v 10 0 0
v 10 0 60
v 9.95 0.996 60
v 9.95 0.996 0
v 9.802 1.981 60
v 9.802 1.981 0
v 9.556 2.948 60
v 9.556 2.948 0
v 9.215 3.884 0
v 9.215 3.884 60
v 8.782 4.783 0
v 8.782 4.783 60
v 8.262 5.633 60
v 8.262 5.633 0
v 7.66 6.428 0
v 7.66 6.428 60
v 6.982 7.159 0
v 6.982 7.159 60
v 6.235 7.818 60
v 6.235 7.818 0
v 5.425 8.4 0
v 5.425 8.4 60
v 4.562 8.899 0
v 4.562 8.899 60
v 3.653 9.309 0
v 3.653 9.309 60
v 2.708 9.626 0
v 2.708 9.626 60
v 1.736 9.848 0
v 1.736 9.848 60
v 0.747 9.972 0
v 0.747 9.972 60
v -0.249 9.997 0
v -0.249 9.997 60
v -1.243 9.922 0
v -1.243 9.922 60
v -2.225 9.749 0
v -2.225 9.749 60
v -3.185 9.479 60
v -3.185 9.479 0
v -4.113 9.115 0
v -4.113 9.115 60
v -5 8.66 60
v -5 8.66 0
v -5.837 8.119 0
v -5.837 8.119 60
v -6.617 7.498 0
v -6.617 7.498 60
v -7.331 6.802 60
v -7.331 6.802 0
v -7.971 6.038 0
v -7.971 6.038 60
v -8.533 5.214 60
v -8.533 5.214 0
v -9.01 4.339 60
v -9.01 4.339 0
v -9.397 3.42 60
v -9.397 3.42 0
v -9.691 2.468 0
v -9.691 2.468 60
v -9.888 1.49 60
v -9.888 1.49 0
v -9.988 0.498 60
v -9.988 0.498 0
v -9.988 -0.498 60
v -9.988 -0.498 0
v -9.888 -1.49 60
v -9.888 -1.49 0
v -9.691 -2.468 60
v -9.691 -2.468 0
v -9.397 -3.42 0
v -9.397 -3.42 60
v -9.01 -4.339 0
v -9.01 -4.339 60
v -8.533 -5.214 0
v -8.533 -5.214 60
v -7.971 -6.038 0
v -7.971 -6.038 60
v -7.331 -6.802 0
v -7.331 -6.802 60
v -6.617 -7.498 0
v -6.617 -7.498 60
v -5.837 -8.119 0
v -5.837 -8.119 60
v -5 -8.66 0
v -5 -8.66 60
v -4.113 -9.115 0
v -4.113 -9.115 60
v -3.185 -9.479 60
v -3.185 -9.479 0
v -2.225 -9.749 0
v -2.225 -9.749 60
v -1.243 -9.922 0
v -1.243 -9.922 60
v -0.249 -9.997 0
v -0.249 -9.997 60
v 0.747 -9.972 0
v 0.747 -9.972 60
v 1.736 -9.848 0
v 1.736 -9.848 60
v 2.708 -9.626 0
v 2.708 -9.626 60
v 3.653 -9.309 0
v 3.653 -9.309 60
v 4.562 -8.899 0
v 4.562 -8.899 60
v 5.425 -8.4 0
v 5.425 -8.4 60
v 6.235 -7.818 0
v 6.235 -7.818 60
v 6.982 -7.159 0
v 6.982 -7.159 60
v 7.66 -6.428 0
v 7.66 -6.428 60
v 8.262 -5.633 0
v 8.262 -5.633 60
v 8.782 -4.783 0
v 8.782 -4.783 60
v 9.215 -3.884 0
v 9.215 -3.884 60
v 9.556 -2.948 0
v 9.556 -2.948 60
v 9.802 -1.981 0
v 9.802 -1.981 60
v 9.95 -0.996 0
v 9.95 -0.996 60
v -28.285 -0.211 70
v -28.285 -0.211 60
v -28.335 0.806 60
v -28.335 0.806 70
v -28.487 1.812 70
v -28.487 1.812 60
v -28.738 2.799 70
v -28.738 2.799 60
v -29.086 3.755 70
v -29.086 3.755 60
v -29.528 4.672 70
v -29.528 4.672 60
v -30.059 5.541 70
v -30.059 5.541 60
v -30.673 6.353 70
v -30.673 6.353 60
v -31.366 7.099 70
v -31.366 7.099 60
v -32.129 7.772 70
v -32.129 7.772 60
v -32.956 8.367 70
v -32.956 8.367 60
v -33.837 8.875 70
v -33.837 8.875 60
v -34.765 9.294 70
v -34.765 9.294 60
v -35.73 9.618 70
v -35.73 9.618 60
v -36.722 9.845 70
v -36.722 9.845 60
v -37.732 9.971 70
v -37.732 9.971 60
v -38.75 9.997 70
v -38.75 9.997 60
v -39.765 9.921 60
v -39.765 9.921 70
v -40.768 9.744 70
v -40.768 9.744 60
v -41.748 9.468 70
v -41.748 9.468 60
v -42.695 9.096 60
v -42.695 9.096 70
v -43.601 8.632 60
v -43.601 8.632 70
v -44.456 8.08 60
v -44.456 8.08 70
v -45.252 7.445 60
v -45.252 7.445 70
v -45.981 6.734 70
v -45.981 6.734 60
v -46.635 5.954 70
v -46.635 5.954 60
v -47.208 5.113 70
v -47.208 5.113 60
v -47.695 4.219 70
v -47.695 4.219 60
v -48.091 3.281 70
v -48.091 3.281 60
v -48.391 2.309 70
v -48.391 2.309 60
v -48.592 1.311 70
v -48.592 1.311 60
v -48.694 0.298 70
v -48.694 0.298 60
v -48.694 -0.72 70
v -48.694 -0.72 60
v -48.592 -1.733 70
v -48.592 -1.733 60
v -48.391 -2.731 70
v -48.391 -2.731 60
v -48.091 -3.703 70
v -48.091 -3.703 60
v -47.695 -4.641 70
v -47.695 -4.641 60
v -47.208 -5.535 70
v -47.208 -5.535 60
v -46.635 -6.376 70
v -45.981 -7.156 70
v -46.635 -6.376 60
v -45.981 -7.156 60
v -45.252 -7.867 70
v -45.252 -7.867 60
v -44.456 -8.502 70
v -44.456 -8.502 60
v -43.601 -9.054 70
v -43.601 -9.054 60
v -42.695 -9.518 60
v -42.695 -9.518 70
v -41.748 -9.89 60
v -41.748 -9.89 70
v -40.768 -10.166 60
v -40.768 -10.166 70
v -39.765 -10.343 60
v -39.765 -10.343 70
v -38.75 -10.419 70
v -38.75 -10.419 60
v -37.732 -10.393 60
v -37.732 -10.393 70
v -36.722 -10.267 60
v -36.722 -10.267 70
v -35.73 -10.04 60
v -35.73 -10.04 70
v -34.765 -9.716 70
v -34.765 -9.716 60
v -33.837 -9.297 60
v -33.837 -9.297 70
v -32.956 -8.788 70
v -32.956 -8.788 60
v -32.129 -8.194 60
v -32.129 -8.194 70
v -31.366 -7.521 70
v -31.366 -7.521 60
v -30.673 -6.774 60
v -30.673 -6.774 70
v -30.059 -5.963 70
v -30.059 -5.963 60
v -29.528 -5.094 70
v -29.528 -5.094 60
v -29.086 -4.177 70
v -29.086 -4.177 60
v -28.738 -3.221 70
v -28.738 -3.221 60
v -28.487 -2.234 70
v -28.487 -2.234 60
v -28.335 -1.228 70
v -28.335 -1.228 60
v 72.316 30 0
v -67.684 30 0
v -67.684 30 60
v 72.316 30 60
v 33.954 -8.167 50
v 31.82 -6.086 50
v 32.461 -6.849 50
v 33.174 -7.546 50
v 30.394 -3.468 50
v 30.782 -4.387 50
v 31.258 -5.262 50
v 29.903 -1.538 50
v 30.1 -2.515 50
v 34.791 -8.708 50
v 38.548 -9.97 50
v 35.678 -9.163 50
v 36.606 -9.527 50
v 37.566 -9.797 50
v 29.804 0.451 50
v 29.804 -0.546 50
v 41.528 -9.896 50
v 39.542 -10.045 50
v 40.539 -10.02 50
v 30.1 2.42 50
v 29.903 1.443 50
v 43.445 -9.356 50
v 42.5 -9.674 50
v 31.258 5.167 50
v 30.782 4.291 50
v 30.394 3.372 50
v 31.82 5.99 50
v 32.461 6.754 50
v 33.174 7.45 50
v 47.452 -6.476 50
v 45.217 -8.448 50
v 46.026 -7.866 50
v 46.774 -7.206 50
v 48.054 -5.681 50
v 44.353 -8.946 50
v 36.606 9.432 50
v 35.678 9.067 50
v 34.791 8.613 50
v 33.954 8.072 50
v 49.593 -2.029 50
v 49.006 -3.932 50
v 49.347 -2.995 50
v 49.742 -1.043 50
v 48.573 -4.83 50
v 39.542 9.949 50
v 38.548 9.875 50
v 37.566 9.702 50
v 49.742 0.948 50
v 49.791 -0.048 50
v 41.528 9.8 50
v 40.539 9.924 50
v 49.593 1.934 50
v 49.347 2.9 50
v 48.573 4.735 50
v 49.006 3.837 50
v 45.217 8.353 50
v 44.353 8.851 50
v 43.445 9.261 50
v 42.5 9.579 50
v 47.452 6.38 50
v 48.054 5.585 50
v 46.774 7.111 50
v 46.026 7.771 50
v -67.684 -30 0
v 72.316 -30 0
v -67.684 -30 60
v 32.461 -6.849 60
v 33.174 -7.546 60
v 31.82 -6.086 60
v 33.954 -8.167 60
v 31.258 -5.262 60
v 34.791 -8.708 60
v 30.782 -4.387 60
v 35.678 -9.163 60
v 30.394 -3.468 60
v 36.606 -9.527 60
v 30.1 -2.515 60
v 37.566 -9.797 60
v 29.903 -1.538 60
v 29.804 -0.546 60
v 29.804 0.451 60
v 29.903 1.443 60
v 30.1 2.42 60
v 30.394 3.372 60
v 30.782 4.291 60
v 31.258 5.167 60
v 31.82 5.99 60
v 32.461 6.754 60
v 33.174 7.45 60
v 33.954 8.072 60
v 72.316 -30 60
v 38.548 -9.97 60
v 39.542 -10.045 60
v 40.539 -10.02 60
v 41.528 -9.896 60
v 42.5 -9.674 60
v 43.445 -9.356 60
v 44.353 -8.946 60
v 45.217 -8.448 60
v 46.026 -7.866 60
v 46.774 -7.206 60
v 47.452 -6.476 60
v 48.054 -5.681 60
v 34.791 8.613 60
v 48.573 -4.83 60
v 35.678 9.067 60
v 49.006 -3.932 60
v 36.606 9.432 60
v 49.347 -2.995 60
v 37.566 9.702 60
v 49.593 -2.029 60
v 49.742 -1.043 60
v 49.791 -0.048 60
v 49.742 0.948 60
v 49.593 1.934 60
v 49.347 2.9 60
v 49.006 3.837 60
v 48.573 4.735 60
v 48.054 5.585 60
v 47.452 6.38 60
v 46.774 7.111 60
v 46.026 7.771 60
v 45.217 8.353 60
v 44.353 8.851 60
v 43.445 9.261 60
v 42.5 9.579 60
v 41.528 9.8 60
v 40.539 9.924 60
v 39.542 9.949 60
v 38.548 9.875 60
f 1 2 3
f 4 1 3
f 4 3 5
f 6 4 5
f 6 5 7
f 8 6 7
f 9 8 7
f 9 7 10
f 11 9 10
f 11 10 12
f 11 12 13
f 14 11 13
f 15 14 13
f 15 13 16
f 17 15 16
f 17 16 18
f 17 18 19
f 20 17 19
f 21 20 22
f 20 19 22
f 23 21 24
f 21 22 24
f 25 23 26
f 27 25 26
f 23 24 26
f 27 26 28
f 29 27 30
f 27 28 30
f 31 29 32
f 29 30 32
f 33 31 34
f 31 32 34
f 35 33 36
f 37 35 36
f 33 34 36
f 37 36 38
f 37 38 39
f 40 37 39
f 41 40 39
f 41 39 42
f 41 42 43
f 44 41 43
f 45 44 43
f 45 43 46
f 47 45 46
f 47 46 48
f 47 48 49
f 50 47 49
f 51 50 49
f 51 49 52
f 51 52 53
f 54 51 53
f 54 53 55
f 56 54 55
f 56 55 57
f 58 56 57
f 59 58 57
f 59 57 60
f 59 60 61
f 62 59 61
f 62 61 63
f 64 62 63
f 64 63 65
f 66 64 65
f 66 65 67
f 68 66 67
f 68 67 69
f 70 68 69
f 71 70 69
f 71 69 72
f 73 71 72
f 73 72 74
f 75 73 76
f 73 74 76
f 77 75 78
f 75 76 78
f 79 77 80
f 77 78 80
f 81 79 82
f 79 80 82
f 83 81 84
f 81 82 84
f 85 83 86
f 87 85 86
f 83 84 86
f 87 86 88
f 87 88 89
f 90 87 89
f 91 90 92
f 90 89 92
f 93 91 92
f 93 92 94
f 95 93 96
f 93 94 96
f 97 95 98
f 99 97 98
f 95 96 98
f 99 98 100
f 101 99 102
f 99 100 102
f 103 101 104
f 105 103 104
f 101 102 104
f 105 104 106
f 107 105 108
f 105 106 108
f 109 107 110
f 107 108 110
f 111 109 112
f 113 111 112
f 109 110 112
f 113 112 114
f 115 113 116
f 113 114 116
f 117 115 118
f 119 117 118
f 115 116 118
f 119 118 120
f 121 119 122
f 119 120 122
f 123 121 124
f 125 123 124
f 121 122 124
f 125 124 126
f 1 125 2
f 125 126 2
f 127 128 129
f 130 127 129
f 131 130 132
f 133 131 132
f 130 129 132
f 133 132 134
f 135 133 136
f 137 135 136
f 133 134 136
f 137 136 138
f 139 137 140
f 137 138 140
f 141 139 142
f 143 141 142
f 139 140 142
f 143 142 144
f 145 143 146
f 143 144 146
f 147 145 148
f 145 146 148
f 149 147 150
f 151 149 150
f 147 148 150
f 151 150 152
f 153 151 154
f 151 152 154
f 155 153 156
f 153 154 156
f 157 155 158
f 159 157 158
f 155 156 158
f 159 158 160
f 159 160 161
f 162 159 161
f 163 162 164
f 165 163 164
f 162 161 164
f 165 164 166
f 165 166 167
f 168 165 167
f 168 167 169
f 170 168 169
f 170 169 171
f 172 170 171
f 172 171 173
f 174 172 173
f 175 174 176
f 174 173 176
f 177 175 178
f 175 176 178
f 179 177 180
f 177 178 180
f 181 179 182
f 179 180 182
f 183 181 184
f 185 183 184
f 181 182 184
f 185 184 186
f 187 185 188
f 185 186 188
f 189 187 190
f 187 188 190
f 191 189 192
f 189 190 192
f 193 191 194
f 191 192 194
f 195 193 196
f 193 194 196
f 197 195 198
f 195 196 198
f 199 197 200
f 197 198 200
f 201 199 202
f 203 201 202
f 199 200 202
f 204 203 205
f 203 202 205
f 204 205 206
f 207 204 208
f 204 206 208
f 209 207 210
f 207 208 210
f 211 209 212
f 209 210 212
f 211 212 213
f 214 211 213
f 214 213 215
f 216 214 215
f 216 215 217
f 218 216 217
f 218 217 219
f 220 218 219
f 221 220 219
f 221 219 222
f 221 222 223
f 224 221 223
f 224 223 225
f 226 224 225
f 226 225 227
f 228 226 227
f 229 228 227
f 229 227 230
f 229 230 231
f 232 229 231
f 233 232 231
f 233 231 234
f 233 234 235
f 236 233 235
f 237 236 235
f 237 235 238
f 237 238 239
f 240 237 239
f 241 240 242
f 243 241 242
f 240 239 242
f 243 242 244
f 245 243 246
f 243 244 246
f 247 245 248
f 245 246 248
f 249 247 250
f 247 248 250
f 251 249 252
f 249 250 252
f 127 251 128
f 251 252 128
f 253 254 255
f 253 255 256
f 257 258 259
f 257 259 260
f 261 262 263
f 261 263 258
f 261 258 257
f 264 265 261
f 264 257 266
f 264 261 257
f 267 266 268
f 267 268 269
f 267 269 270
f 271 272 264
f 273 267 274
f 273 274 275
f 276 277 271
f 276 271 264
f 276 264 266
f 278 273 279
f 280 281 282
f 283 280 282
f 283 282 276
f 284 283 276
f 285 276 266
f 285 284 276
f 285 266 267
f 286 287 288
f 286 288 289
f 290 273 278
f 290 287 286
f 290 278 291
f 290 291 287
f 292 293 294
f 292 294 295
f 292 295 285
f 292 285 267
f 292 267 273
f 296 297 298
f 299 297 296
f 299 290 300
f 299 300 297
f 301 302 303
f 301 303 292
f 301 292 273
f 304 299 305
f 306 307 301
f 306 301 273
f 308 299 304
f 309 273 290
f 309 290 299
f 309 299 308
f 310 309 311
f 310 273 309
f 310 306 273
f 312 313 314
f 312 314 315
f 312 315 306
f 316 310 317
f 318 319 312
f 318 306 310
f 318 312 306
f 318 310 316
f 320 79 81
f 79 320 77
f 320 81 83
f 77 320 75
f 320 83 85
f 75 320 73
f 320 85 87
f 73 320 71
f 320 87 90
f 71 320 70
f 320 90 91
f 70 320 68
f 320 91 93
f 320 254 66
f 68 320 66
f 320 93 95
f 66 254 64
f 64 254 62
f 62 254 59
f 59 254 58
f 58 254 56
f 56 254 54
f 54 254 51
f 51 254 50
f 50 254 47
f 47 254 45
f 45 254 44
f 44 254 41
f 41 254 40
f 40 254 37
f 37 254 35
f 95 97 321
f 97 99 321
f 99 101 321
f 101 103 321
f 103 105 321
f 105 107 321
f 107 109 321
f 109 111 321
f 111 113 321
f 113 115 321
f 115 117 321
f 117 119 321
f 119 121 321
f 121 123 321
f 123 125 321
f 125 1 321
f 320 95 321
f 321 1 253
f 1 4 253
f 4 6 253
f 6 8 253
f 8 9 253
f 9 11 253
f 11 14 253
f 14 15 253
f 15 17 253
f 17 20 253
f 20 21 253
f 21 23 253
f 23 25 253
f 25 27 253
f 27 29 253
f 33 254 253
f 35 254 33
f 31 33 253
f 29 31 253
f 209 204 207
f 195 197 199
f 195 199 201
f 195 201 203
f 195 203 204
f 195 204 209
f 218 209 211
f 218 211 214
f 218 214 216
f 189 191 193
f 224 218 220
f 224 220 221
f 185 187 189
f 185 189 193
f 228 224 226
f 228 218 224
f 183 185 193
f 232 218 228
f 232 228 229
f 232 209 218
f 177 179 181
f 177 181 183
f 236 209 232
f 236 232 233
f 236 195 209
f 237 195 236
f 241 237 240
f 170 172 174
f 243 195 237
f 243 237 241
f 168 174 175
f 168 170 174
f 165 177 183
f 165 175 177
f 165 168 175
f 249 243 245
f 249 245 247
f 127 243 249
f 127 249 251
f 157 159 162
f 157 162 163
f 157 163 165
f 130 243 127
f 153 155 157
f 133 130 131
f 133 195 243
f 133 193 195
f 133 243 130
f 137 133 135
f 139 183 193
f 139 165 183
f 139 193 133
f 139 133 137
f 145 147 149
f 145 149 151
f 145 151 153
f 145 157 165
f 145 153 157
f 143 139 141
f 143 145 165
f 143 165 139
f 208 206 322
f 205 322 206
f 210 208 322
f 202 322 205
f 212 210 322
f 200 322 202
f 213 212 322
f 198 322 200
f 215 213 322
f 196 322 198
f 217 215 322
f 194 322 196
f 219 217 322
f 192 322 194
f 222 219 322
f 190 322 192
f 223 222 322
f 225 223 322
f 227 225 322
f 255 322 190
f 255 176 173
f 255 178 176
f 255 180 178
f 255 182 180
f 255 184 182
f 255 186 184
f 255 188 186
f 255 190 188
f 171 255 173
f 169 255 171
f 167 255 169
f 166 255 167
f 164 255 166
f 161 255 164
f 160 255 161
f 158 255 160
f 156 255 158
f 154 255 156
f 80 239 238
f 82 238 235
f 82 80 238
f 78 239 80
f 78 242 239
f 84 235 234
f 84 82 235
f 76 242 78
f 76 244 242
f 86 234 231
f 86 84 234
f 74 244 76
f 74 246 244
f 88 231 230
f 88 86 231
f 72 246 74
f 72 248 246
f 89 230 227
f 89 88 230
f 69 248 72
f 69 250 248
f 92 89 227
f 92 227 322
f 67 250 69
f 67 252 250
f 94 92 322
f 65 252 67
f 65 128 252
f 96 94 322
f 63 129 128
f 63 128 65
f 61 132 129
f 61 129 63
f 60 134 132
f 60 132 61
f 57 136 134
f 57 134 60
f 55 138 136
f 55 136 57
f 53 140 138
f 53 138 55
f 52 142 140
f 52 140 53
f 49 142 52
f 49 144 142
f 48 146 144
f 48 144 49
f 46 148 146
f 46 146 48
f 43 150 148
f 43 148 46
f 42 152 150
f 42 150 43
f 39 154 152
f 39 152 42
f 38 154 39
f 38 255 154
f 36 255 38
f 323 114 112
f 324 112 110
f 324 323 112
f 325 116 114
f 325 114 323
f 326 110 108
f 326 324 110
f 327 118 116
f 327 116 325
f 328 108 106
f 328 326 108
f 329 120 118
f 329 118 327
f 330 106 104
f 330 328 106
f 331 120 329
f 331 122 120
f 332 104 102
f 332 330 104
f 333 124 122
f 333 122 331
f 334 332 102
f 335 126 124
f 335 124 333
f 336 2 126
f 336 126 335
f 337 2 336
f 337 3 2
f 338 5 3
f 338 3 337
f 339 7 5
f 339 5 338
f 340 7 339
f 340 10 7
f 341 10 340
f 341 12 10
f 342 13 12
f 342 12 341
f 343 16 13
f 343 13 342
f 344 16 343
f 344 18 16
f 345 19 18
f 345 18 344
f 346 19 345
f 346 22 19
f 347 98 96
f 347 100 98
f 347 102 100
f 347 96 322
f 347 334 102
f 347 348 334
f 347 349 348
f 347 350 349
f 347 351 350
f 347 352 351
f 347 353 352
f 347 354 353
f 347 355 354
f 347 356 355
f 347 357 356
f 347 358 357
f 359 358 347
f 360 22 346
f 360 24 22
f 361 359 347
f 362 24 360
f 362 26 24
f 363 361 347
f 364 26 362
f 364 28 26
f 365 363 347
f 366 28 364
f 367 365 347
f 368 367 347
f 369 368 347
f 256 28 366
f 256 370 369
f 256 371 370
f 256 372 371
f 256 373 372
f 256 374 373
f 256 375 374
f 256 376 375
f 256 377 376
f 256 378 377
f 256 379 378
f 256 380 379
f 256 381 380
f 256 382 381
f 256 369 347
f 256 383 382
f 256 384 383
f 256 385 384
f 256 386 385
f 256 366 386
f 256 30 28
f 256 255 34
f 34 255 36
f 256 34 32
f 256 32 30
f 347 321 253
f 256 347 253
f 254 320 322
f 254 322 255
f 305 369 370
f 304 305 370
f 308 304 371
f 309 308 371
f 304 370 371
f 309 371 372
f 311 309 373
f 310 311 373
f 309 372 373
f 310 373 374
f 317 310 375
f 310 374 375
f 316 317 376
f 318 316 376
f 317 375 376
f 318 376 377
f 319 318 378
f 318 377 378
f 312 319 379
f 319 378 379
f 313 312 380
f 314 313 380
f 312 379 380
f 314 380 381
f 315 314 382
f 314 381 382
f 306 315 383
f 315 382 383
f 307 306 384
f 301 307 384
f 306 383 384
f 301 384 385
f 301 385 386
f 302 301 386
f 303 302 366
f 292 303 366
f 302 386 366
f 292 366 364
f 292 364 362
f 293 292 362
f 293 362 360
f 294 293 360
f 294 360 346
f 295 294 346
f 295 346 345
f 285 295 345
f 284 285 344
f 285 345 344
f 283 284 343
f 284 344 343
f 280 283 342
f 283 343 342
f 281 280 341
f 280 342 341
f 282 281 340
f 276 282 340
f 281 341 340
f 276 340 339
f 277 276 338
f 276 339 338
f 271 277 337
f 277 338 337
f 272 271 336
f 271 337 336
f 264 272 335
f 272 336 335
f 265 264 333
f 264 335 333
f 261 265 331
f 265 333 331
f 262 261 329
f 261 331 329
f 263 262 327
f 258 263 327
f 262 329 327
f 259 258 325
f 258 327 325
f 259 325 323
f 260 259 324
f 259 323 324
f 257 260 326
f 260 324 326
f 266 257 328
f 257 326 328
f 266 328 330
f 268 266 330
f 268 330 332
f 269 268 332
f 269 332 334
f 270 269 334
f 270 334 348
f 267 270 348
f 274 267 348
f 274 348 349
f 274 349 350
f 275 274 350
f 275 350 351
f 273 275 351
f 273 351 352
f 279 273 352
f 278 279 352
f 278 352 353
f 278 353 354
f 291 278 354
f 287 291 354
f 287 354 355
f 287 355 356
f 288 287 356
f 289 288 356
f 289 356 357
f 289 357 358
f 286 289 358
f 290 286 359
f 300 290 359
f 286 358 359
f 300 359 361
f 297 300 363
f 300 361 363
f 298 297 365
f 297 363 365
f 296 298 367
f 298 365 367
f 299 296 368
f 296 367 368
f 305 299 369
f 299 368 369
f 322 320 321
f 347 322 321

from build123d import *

# Parameters (mm, degrees)
F0_W     = 140
F0_H     = 60
F1_DEPTH = 60
F3_R     = 10.210921
F6_DEPTH = 10
F4_R     = 10
F7_DEPTH = 110.6
F5_R     = 10
F8_DEPTH = 10


with BuildPart() as f1:
    # F0 (on Top) → F1 (new body)
    with BuildSketch(Plane.XY):
        with Locations((2.316078, 0)):
            Rectangle(F0_W, F0_H)
    extrude(amount=F1_DEPTH)

    # F3 (on face) → F6 (join)
    with BuildSketch(Plane.XY.offset(60)):
        with BuildLine():
            ThreePointArc((-48.704213, 0), (-38.600937, -10.421296), (-28.284551, -0.210921))
            ThreePointArc((-28.284551, -0.210921), (-38.390005, 9.999455), (-48.704213, 0))
        make_face()
        with Locations((-38.495471, -0.210921)):
            Circle(F3_R)
    extrude(amount=F6_DEPTH)

    # F4 (on face) → F7 (cut)
    with BuildSketch(Plane.XY.offset(60)):
        Circle(F4_R)
    extrude(amount=-F7_DEPTH, mode=Mode.SUBTRACT)

    # F5 (on face) → F8 (cut)
    with BuildSketch(Plane.XY.offset(60)):
        with Locations((39.79122, -0.047711)):
            Circle(F5_R)
    extrude(amount=-F8_DEPTH, mode=Mode.SUBTRACT)


solid = f1.part
